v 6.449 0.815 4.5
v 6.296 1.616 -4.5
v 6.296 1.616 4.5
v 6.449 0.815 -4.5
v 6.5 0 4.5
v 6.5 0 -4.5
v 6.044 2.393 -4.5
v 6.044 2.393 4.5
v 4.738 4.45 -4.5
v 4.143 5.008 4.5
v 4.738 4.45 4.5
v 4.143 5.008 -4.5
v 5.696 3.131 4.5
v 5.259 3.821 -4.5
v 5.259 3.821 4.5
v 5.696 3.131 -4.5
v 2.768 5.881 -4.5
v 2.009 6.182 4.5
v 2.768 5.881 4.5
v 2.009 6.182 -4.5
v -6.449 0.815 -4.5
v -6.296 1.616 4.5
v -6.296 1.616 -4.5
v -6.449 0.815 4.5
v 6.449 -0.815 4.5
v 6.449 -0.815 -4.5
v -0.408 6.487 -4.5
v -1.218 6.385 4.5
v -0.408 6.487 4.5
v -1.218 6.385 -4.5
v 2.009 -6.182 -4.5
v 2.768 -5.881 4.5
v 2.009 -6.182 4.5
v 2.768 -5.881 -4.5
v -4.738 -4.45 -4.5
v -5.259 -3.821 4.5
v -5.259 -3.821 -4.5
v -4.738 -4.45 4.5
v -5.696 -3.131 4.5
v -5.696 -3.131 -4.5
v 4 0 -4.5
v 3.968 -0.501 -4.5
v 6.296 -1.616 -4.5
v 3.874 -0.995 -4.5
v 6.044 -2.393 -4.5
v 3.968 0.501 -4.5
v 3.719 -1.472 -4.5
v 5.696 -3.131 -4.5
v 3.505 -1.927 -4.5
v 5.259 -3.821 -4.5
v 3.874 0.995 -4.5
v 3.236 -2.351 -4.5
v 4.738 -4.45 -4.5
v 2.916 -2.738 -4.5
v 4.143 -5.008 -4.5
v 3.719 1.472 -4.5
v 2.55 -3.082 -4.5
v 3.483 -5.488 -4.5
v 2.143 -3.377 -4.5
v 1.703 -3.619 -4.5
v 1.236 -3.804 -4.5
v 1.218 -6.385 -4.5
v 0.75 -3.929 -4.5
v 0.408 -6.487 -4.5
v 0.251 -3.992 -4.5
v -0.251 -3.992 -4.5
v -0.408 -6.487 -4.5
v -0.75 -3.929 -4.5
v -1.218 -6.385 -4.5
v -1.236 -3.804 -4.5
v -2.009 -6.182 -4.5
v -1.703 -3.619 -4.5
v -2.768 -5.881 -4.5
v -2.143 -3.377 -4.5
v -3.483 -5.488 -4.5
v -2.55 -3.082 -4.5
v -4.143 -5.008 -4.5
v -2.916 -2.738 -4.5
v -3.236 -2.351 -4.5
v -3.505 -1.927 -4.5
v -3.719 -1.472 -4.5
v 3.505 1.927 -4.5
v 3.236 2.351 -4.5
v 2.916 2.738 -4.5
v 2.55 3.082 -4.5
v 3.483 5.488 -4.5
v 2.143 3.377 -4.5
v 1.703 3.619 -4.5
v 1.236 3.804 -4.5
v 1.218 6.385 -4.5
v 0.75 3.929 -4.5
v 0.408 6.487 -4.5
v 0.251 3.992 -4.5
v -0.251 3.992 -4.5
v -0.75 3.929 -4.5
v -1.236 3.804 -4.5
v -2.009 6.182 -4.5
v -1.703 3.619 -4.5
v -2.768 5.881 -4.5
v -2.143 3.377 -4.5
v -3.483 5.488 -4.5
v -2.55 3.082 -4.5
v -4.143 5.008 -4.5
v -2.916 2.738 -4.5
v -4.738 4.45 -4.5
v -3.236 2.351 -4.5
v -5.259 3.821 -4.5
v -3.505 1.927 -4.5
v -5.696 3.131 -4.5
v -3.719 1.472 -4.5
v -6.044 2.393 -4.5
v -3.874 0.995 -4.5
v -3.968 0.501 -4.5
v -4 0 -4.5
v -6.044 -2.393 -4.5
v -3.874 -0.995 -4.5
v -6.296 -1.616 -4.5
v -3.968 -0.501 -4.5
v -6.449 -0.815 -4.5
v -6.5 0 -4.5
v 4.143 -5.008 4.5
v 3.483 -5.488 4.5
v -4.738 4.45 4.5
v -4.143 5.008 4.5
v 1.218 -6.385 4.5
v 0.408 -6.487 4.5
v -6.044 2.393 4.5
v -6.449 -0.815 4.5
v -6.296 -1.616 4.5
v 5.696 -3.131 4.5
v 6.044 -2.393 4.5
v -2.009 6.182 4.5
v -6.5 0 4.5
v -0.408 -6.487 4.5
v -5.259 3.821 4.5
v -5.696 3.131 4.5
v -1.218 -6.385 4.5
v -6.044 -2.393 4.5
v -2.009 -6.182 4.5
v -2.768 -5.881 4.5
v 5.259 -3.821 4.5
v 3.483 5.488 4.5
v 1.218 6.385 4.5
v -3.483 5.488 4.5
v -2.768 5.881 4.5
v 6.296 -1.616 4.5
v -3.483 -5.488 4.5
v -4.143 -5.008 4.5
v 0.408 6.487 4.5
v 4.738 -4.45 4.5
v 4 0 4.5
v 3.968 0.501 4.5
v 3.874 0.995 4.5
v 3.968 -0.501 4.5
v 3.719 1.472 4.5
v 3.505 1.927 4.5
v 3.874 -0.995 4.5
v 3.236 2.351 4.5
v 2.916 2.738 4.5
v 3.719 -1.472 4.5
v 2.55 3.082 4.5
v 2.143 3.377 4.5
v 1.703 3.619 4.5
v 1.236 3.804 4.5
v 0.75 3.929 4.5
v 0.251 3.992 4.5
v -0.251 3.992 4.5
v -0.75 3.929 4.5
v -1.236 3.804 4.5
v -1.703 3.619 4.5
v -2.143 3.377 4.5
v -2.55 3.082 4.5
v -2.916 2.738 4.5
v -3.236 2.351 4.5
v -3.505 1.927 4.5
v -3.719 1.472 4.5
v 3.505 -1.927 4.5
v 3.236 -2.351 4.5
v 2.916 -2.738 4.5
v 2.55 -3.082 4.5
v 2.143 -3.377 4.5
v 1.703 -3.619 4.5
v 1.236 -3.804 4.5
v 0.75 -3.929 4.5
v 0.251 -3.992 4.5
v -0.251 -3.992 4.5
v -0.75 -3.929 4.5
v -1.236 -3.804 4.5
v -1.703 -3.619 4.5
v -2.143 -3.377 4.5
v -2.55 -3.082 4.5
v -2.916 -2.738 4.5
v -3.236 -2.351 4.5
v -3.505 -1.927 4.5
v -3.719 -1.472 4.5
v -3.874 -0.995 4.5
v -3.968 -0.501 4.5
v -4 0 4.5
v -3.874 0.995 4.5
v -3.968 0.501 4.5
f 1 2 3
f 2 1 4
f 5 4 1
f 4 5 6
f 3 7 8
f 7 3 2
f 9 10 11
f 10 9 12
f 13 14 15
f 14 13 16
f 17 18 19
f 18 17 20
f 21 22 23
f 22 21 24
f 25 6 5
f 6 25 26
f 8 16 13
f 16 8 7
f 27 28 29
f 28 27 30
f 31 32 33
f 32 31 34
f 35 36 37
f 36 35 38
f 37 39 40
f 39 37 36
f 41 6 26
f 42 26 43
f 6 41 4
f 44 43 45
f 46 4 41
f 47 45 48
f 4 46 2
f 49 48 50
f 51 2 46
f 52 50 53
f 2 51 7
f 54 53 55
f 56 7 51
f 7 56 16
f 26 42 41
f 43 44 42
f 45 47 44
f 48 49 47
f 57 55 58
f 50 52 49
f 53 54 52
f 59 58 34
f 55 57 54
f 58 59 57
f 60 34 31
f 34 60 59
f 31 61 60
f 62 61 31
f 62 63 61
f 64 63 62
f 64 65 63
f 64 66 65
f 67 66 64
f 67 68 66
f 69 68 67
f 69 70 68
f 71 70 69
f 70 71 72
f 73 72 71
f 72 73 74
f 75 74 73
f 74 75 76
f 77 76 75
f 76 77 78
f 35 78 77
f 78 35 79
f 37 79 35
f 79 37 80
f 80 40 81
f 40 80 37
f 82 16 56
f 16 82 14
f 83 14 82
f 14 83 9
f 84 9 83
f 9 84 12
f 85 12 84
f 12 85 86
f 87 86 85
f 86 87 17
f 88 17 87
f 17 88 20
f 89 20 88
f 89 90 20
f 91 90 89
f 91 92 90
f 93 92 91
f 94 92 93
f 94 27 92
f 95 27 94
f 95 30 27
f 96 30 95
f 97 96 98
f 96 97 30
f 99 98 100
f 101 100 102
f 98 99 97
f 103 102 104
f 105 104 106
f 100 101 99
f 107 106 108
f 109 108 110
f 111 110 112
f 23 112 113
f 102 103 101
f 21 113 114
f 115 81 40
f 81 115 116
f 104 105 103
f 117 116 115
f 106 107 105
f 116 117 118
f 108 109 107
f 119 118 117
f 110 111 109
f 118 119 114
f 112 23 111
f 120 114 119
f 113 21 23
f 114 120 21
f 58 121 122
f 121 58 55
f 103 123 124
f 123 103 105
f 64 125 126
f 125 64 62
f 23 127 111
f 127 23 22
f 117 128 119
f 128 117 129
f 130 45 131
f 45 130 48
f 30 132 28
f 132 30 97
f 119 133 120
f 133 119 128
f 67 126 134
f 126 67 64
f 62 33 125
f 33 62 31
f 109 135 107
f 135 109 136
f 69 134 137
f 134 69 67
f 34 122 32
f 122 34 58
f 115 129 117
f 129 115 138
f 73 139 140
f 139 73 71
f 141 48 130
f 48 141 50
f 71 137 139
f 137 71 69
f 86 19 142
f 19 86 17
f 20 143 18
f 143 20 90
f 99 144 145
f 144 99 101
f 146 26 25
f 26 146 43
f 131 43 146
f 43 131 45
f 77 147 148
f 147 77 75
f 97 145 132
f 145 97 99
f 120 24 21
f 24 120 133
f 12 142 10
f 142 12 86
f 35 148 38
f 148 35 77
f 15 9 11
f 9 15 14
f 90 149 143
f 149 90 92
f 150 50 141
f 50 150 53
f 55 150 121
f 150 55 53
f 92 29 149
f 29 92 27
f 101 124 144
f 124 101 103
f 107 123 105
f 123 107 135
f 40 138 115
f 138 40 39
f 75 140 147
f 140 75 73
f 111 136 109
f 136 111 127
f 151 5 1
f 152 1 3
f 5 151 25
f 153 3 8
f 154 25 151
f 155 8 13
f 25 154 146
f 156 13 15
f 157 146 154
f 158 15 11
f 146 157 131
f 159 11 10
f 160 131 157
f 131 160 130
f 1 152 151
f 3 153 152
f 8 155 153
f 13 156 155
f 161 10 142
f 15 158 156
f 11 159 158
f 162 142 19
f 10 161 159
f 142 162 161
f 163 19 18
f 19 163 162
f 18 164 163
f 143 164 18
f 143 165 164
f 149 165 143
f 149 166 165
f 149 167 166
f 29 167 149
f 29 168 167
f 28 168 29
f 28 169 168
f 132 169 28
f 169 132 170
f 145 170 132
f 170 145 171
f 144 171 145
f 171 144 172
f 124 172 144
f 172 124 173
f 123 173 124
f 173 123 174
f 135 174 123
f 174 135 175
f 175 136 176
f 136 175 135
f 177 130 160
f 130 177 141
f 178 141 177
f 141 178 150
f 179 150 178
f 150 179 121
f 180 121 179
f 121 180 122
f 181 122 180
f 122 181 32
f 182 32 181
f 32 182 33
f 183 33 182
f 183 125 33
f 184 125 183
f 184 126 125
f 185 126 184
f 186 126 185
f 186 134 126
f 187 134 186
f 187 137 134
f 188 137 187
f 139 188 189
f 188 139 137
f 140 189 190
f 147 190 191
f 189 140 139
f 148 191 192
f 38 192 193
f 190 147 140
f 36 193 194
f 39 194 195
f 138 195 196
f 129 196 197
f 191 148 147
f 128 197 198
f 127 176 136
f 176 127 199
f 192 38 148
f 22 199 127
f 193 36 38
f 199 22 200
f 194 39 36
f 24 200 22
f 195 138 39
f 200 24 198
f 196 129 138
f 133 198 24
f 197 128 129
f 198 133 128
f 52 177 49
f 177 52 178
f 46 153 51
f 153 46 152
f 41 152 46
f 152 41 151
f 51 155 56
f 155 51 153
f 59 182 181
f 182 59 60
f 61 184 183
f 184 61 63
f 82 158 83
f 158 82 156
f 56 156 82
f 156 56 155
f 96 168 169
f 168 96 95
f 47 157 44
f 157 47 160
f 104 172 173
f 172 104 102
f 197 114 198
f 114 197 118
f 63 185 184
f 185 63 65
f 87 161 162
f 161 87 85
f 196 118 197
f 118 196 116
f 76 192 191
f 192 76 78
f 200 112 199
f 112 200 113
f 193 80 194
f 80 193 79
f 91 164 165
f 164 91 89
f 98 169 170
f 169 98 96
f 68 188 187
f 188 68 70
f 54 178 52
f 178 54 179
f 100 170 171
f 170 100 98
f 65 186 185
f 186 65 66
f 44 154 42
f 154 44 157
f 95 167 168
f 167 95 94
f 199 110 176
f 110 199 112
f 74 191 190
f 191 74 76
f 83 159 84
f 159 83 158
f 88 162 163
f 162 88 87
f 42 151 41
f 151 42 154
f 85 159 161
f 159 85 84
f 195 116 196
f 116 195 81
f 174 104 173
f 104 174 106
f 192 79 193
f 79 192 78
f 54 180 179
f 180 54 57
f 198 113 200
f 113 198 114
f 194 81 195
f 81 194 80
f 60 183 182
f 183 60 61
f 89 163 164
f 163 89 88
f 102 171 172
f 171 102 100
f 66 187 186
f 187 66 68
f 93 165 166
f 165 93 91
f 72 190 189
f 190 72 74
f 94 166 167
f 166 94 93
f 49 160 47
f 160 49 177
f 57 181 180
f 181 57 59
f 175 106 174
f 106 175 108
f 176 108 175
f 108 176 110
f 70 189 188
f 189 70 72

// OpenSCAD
$fn = 50;


difference() {
	union() {
		translate(v = [0, 0, -4.5000000000]) {
			cylinder(h = 9, r = 6.5000000000);
		}
	}
	union() {
		translate(v = [0, 0, -100.0000000000]) {
			cylinder(h = 200, r = 4.0000000000);
		}
	}
}
